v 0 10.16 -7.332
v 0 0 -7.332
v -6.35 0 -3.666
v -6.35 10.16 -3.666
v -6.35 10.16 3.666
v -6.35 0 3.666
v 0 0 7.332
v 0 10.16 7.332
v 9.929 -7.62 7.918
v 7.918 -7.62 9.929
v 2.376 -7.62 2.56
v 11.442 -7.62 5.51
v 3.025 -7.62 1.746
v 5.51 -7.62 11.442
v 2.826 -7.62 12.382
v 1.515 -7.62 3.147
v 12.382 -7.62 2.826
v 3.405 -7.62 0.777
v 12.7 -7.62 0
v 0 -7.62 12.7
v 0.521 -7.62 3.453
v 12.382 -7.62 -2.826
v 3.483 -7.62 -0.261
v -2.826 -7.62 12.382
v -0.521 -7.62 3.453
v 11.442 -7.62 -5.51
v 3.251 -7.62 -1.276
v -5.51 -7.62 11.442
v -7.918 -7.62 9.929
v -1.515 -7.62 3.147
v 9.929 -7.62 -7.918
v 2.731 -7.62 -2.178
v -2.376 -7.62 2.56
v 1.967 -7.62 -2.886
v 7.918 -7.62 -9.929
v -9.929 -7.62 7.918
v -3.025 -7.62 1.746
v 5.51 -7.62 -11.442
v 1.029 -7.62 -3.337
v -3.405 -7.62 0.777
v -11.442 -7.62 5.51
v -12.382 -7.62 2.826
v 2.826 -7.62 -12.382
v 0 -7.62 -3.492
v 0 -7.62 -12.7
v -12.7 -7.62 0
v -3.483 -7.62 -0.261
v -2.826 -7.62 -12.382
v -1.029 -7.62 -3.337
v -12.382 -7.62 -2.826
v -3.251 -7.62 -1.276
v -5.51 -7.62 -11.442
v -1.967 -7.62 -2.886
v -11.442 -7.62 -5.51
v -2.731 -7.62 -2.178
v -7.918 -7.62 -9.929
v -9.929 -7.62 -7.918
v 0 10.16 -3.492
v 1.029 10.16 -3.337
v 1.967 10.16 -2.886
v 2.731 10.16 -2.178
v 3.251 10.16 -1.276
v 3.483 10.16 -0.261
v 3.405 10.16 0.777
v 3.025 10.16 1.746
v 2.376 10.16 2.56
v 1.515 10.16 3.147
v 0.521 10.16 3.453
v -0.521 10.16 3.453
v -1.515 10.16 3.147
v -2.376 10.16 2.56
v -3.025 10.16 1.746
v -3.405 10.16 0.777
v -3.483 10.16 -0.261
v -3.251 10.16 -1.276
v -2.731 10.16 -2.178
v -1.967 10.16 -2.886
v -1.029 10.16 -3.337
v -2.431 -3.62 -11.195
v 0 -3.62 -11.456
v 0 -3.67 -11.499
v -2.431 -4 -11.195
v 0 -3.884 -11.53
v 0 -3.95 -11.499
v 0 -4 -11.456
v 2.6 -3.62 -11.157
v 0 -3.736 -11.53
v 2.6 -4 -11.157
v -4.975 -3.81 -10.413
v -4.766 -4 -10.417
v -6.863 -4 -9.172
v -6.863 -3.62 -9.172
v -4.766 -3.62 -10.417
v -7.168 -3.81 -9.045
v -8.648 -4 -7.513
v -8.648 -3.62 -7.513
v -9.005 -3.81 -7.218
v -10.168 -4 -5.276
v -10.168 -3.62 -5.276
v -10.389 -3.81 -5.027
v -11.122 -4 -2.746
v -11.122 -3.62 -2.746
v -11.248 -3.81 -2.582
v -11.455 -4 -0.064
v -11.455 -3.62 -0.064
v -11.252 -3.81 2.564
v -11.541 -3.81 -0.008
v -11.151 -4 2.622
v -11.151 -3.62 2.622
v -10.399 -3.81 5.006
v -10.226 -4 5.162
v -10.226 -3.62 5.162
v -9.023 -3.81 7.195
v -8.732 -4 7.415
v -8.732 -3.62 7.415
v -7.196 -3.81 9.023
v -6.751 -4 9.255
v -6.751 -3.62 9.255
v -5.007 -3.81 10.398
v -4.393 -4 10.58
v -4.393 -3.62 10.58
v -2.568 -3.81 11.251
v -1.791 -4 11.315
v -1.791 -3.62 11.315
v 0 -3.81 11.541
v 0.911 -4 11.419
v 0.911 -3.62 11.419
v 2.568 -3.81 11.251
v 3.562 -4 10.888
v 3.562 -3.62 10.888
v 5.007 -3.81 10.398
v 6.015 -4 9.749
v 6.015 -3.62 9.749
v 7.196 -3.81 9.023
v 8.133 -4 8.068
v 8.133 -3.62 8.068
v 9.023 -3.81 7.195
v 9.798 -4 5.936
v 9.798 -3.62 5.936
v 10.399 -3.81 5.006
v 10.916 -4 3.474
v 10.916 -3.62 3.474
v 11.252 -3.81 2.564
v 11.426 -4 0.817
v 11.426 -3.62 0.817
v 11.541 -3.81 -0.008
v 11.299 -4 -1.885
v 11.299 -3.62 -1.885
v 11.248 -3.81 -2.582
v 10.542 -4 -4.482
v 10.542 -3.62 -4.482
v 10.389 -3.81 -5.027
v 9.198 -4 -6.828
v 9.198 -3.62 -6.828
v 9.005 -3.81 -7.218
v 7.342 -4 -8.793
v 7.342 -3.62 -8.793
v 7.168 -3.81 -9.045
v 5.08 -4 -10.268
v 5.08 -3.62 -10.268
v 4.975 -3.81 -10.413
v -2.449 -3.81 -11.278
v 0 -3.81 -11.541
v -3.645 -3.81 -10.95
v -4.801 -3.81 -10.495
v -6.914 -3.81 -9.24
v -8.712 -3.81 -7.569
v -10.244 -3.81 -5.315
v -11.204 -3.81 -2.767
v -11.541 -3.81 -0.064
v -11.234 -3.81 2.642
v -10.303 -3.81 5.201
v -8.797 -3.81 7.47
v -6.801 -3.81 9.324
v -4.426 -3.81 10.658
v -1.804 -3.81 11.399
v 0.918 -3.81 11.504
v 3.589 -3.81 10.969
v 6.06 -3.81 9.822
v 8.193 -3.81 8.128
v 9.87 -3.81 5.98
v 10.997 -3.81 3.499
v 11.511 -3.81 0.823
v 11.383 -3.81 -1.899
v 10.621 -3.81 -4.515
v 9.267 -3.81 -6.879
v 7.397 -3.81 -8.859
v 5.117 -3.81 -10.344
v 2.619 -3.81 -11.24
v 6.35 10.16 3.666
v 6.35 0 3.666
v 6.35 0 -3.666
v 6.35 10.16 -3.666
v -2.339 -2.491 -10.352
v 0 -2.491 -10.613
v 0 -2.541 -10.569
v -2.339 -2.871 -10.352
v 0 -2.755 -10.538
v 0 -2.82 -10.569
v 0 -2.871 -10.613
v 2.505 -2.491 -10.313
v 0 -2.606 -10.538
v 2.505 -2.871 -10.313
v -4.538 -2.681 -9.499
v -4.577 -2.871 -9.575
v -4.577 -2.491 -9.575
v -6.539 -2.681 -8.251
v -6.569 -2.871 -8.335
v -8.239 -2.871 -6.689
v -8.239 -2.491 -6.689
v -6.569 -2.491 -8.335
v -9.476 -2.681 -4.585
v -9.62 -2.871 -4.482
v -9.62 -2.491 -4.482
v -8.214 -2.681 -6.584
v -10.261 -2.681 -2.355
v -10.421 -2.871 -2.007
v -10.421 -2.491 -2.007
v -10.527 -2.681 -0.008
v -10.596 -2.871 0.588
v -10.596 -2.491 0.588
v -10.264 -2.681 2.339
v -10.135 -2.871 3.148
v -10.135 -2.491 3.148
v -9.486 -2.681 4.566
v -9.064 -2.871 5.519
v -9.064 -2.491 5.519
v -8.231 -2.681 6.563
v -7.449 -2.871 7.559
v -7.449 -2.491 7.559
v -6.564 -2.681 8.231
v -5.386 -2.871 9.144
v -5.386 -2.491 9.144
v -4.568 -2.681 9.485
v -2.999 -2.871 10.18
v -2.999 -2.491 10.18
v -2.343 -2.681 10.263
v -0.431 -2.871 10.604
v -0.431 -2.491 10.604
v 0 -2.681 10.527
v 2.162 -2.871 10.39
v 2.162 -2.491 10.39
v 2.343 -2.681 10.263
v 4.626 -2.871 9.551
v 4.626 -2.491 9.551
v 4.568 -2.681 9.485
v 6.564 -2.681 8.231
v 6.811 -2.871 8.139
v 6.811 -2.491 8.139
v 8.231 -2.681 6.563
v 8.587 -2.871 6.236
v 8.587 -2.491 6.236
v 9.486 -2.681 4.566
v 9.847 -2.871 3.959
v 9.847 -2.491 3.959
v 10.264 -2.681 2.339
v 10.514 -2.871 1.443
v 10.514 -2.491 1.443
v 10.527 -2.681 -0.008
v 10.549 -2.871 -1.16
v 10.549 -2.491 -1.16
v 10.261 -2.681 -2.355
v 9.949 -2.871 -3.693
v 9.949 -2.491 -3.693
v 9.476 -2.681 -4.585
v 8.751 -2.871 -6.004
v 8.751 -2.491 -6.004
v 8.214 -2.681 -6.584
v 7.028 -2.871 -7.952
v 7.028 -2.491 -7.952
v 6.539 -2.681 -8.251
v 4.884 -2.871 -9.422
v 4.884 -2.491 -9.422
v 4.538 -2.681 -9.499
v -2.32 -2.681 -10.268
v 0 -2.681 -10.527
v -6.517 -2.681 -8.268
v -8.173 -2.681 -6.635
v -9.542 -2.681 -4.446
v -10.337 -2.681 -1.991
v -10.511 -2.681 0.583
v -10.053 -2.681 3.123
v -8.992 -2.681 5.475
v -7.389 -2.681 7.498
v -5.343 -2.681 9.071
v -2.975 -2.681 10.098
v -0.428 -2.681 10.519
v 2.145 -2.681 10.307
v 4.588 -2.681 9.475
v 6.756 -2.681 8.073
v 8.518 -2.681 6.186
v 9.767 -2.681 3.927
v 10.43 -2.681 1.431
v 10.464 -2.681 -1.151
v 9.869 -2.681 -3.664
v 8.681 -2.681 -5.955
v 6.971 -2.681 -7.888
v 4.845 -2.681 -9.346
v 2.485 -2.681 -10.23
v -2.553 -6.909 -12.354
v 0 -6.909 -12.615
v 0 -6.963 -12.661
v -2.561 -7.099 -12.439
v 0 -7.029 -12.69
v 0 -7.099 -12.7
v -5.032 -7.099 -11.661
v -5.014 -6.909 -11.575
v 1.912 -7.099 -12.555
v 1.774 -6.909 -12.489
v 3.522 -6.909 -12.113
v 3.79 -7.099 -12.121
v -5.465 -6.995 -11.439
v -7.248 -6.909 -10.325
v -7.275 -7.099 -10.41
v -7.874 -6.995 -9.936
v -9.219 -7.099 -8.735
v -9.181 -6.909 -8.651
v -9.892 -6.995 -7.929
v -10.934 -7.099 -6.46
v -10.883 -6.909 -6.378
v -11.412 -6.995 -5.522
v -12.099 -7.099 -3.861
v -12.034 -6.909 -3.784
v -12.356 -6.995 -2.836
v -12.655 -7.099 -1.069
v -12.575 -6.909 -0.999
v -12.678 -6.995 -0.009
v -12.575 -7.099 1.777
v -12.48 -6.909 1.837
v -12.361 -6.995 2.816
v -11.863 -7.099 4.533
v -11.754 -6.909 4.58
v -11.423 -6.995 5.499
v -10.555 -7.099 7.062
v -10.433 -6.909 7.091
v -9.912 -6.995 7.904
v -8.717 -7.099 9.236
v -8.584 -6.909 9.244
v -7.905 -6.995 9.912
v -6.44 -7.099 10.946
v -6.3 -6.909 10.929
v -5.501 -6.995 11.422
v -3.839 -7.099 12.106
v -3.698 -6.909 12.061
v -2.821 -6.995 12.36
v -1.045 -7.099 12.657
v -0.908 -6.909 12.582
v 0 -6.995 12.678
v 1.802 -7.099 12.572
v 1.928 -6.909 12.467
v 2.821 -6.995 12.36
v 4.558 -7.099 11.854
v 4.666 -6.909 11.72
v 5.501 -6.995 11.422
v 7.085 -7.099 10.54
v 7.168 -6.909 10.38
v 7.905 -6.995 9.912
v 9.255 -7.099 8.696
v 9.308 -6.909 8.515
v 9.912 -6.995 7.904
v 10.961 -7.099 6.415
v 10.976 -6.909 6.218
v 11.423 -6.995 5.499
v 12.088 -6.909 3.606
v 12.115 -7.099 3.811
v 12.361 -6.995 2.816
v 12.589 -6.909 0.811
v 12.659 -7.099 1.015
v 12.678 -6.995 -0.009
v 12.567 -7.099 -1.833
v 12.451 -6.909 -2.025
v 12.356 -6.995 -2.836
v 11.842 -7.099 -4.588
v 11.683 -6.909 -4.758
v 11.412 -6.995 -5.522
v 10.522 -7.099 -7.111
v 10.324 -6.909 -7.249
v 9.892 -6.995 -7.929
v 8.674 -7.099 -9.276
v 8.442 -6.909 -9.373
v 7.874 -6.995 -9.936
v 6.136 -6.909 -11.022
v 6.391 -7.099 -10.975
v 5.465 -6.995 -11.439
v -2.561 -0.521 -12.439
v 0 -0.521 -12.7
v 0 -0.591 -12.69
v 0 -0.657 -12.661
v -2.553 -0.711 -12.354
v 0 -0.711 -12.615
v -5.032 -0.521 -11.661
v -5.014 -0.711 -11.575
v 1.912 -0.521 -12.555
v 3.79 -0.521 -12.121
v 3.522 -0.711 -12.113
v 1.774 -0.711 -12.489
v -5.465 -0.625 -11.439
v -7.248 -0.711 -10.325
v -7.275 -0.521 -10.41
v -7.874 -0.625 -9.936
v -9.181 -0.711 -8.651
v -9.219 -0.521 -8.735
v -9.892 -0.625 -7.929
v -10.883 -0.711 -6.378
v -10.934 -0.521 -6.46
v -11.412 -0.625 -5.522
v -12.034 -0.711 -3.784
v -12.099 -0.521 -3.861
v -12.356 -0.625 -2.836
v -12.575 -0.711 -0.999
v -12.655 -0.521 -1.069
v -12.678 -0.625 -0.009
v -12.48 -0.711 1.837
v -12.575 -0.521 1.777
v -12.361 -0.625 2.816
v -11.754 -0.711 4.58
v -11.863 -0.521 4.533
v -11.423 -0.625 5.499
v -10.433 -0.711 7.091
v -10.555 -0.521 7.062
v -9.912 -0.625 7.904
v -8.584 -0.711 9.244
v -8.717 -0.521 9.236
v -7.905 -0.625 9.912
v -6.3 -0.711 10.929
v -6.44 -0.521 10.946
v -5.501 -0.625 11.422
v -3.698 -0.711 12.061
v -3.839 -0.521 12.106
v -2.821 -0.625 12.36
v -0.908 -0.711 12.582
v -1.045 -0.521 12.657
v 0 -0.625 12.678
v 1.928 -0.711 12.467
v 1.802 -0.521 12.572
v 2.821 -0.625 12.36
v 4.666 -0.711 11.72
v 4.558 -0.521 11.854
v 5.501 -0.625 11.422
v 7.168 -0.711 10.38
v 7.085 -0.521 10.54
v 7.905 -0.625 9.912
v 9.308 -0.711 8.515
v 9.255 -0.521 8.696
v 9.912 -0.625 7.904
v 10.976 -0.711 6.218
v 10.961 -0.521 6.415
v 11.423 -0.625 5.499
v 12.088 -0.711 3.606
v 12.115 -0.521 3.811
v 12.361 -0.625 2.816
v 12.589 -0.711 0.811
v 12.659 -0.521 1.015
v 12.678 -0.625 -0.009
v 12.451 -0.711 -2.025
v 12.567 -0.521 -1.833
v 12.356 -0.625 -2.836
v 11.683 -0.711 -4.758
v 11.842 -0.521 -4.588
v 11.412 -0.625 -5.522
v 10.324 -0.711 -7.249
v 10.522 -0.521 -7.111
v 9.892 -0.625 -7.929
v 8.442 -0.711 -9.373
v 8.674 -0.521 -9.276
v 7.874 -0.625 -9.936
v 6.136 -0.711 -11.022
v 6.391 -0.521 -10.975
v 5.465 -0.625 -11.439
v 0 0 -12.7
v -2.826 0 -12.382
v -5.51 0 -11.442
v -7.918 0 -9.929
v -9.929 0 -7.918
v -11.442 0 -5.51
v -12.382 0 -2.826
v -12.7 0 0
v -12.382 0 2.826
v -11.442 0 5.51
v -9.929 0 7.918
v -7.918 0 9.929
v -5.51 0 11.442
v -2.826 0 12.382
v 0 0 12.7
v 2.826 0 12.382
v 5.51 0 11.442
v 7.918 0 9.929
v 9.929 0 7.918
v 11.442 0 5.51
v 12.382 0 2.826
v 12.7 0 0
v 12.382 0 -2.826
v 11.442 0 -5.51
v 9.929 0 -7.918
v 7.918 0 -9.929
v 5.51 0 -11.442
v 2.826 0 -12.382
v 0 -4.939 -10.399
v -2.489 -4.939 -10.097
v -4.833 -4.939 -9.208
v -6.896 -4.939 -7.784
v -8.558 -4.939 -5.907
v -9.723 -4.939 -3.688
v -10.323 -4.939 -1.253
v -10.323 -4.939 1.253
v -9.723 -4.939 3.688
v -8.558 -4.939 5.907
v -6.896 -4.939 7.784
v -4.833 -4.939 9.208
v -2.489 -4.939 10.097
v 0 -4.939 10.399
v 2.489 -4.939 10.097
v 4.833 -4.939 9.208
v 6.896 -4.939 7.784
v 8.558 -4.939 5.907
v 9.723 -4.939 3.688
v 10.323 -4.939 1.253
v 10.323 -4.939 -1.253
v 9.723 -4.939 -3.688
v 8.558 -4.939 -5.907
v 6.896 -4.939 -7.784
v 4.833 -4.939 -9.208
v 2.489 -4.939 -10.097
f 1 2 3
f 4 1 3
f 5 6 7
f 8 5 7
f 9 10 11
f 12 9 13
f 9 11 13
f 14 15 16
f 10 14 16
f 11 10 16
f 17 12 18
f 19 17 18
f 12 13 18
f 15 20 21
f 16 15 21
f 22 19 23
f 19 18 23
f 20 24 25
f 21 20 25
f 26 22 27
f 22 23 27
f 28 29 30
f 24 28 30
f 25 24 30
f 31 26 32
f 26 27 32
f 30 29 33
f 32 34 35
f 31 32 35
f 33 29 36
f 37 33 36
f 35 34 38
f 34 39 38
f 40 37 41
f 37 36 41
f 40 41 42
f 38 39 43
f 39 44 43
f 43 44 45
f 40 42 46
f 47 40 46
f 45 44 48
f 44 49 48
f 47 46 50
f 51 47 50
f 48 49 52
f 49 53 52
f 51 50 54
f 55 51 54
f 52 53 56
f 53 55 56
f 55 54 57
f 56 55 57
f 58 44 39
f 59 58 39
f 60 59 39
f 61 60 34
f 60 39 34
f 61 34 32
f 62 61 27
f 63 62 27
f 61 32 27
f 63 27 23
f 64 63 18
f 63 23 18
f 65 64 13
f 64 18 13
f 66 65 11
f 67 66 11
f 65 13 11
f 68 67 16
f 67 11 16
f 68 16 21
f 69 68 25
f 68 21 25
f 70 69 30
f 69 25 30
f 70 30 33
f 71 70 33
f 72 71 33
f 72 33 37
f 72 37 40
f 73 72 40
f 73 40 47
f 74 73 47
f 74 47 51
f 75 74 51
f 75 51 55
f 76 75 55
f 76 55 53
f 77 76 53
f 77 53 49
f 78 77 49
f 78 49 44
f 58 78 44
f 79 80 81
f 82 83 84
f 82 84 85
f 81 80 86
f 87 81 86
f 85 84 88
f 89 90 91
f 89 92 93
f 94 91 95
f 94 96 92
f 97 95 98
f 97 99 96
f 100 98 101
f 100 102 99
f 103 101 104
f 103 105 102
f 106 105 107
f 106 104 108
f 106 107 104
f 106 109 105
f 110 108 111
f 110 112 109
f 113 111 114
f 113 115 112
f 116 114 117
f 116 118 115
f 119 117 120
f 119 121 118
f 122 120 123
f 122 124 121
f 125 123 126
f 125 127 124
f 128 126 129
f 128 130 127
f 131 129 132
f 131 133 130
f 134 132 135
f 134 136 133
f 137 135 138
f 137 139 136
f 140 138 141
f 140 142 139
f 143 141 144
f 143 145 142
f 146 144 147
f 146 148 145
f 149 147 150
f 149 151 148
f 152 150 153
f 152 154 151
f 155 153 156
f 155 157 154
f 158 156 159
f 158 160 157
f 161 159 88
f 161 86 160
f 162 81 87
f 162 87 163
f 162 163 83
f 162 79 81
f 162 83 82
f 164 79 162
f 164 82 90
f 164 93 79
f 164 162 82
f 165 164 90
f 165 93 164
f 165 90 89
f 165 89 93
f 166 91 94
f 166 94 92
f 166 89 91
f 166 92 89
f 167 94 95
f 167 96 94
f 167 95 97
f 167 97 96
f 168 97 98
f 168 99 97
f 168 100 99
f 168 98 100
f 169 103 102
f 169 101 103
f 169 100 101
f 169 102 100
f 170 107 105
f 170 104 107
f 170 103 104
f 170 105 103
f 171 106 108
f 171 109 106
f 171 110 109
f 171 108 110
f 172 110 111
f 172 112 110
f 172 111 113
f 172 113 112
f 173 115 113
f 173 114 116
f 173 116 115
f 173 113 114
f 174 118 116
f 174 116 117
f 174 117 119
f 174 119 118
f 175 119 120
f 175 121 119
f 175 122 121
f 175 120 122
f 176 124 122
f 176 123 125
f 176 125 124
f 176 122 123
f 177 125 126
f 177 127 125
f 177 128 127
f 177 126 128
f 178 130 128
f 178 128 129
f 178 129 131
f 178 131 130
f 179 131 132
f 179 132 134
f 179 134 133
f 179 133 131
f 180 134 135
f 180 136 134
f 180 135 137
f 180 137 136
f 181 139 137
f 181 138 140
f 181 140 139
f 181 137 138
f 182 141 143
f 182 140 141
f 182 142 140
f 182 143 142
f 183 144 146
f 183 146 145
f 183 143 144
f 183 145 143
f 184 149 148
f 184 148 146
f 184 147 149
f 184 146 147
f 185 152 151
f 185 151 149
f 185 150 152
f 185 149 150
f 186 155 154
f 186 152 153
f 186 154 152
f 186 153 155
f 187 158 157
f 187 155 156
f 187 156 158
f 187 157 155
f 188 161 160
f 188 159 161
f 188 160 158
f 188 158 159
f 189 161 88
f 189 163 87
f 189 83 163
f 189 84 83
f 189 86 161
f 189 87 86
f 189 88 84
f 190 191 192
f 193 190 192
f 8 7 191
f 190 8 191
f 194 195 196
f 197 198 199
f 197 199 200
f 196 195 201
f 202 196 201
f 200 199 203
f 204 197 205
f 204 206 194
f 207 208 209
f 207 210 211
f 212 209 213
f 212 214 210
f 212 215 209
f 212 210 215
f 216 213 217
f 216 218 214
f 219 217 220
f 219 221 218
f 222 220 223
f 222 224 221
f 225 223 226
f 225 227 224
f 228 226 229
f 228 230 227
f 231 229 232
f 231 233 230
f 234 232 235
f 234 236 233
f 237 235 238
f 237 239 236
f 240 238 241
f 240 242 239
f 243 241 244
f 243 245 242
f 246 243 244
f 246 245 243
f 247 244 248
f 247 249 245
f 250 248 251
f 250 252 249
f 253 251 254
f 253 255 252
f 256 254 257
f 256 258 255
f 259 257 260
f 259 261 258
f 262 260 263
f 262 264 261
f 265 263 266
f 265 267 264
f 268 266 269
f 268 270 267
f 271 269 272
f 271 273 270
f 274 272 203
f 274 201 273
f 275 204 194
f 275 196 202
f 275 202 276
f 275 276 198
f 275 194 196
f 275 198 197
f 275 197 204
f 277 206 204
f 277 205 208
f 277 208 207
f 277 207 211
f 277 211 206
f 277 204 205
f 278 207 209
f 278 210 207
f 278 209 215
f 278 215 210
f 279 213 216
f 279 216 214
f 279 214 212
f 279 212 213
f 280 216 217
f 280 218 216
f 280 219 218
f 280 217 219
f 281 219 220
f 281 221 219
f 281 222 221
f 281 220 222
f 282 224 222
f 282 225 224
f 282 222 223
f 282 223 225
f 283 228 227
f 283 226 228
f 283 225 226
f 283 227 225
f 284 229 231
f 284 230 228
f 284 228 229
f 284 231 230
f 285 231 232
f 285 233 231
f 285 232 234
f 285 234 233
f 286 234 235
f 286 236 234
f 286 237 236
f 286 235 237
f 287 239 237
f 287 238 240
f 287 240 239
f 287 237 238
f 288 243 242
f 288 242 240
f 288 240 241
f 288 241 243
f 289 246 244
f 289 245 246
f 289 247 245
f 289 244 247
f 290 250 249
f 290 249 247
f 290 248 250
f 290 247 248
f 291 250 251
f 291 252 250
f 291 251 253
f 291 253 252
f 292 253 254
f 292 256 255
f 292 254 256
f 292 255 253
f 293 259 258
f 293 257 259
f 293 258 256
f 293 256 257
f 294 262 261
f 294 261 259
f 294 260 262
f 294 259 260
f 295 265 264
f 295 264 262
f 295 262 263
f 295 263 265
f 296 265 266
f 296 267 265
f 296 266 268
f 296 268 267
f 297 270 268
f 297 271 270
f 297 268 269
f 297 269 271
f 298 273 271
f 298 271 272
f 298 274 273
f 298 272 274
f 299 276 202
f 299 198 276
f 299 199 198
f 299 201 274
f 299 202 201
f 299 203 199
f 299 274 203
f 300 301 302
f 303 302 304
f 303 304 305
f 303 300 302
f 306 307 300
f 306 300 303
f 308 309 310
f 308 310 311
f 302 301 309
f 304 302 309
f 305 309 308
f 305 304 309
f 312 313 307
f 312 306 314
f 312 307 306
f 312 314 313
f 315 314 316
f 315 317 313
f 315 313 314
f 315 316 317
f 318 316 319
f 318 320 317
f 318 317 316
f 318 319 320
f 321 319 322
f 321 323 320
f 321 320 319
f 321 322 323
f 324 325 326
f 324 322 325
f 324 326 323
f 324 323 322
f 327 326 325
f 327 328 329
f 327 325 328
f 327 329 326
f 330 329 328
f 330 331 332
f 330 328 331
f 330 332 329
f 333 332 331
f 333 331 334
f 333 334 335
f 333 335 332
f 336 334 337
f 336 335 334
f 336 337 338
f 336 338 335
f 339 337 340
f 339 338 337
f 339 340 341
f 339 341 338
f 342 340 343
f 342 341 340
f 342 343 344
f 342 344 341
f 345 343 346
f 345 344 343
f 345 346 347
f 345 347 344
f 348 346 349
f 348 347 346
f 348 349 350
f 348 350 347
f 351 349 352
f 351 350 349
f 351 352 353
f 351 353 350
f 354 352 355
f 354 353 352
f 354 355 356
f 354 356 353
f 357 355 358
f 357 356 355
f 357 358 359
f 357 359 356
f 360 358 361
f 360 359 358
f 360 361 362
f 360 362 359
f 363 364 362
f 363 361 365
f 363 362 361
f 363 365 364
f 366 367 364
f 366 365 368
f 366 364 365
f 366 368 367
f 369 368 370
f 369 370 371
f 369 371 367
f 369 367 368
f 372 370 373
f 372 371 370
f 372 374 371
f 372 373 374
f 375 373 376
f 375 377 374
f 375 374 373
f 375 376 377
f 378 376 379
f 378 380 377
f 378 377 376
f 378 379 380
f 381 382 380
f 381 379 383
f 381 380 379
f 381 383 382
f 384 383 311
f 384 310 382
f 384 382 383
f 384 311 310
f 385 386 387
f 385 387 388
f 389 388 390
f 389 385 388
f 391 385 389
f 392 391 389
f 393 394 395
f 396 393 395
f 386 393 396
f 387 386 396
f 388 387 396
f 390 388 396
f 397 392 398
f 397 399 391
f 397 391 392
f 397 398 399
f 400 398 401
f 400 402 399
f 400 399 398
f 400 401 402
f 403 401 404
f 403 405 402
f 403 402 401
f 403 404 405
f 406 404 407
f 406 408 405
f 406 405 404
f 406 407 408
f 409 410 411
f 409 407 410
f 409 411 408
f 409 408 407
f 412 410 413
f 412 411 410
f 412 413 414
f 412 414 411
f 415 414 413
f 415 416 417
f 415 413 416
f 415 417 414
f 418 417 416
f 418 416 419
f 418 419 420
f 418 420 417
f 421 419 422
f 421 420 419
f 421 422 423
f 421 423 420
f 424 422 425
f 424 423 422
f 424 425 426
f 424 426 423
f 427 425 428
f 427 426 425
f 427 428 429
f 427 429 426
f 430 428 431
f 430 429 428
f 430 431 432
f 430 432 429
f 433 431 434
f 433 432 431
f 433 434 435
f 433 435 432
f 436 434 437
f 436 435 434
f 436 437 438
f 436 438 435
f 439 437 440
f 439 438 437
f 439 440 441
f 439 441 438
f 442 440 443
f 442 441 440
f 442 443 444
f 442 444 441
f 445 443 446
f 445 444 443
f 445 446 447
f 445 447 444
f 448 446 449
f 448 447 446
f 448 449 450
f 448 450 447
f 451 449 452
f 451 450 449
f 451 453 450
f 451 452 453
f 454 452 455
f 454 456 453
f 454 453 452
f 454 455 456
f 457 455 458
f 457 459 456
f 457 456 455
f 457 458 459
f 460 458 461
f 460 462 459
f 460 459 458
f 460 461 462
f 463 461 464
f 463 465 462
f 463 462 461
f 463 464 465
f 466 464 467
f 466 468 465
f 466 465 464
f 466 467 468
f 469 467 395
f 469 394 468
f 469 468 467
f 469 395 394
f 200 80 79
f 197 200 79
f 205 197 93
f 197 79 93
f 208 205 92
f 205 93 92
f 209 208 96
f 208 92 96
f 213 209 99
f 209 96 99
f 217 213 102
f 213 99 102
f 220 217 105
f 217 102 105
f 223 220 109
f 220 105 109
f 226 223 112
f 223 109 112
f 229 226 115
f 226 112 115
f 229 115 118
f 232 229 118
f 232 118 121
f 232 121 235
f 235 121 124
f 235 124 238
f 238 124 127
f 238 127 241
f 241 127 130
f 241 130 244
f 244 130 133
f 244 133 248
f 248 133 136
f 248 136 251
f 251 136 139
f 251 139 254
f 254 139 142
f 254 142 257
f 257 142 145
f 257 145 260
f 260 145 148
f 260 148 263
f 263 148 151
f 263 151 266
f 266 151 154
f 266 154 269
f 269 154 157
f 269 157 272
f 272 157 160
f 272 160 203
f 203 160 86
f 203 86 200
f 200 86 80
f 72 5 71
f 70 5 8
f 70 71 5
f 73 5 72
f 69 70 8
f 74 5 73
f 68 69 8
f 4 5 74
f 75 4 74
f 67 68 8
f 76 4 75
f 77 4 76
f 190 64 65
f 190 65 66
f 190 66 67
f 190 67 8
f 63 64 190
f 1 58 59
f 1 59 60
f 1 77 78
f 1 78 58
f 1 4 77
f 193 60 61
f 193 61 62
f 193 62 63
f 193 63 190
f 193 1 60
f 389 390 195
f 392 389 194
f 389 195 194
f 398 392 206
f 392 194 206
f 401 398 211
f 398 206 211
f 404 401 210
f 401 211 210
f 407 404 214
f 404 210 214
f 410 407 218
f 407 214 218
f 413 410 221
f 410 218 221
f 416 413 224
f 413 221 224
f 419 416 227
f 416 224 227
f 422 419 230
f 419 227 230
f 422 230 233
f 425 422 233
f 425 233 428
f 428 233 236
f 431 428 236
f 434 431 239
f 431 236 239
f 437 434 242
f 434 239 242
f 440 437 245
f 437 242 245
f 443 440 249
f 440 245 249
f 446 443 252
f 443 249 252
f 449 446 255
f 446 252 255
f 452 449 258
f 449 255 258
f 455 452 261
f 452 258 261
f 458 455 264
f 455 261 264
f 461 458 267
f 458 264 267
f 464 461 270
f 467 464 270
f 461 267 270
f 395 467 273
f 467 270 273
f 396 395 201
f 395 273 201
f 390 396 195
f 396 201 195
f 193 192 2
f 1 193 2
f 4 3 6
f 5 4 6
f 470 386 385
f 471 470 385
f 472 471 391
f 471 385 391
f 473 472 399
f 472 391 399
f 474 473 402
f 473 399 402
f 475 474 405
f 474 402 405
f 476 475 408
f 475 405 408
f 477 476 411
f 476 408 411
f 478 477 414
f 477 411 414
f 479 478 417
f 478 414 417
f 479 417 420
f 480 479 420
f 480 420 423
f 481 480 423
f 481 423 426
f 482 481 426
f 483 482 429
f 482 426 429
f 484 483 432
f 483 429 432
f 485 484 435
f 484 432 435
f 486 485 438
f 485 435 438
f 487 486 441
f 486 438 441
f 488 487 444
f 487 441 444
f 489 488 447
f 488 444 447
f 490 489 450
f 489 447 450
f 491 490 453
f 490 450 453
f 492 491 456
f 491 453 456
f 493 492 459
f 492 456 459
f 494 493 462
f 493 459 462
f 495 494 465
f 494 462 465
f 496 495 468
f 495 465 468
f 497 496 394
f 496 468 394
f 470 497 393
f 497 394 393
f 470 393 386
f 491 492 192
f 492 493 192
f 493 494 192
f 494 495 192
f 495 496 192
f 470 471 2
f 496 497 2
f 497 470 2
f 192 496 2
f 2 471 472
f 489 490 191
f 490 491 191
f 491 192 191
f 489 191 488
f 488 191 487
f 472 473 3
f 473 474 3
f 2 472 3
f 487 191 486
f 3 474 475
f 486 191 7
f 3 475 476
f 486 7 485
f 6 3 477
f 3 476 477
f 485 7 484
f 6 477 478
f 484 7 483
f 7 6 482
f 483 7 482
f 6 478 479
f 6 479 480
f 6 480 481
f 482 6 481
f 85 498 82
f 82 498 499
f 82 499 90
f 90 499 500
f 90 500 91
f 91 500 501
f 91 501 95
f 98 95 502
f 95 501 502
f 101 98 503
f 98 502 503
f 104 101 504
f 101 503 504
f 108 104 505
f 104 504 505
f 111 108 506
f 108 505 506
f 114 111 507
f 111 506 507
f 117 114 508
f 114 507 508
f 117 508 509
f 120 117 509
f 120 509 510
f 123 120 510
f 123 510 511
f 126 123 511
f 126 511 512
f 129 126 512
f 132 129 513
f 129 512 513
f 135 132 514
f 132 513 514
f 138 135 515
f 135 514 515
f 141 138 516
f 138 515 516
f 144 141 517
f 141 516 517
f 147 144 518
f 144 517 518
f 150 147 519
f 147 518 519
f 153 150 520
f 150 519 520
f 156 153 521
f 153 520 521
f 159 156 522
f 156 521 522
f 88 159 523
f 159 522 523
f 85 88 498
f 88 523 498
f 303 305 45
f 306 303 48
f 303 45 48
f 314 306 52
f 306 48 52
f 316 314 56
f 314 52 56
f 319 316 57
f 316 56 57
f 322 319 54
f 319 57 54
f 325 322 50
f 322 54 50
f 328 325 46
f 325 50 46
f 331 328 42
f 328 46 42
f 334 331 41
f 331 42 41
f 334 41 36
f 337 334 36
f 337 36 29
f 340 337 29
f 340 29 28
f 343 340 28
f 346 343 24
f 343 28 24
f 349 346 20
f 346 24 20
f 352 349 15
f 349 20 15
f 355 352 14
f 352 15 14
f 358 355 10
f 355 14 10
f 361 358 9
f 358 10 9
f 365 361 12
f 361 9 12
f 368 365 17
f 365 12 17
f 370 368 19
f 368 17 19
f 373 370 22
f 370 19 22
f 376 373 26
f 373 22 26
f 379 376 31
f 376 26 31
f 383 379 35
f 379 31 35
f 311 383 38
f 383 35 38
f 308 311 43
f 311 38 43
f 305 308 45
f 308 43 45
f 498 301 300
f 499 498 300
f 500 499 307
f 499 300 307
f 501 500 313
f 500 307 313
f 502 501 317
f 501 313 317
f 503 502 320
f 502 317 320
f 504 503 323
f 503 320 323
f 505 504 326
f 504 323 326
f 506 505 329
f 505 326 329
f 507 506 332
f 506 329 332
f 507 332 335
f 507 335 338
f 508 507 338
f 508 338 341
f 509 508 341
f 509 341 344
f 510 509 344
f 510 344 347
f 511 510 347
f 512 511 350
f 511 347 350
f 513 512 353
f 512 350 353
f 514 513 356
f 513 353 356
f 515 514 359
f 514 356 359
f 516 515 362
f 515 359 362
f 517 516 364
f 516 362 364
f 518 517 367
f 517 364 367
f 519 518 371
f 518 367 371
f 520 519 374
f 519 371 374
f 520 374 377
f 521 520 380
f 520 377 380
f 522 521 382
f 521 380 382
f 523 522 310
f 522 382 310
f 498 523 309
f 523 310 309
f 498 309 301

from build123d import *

# Parameters (mm, degrees)
BOSS_EXTRUDE1_DEPTH = 10.16
FILLET1_R           = 0.254
SKETCH4_R           = 3.4925
CUT_EXTRUDE1_DEPTH  = 26.272681003


with BuildPart() as part:
    # Sketch1 → Boss-Extrude1 (new body)
    with BuildSketch(Plane(origin=(0, 0, 0), x_dir=(1, 0, 0), z_dir=(0, 1, 0))):
        Polygon((0, 7.332348419), (-6.35, 3.666174209), (-6.35, -3.666174209), (0, -7.332348419), (6.35, -3.666174209), (6.35, 3.666174209), align=None)
    extrude(amount=BOSS_EXTRUDE1_DEPTH)

    # Sketch3 → Revolve1 (revolve)
    with BuildSketch(Plane.XY, mode=Mode.PRIVATE) as revolve1_sk:
        Polygon((0, 0), (-12.7, 0), (-12.7, -0.635), (-10.399064962, -2.680813959), (-11.669064962, -3.81), (-10.399064962, -4.939186041), (-12.7, -6.985), (-12.7, -7.62), (0, -7.62), align=None)
    revolve(revolve1_sk.sketch.rotate(Axis((0, -7.62, 0), (0, 1, 0)), 270), axis=Axis((0, -7.62, 0), (0, 1, 0)))

    # Fillet1
    fillet1_edges = [part.edges().sort_by_distance(p)[0] for p in [
        (0, -0.635, 12.7),
        (0, -2.680813959, 10.399064962),
        (0, -3.81, 11.669064962),
        (0, -6.985, 12.7),
    ]]
    fillet(fillet1_edges, radius=FILLET1_R)

    # Sketch4 → Cut-Extrude1 (cut, through all)
    with BuildSketch(Plane.XZ.offset(7.62)):
        with Locations(Location((0, 0, 0), (0, 0, 270))):
            Circle(SKETCH4_R)
    extrude(amount=-CUT_EXTRUDE1_DEPTH, mode=Mode.SUBTRACT)


solid = part.part
